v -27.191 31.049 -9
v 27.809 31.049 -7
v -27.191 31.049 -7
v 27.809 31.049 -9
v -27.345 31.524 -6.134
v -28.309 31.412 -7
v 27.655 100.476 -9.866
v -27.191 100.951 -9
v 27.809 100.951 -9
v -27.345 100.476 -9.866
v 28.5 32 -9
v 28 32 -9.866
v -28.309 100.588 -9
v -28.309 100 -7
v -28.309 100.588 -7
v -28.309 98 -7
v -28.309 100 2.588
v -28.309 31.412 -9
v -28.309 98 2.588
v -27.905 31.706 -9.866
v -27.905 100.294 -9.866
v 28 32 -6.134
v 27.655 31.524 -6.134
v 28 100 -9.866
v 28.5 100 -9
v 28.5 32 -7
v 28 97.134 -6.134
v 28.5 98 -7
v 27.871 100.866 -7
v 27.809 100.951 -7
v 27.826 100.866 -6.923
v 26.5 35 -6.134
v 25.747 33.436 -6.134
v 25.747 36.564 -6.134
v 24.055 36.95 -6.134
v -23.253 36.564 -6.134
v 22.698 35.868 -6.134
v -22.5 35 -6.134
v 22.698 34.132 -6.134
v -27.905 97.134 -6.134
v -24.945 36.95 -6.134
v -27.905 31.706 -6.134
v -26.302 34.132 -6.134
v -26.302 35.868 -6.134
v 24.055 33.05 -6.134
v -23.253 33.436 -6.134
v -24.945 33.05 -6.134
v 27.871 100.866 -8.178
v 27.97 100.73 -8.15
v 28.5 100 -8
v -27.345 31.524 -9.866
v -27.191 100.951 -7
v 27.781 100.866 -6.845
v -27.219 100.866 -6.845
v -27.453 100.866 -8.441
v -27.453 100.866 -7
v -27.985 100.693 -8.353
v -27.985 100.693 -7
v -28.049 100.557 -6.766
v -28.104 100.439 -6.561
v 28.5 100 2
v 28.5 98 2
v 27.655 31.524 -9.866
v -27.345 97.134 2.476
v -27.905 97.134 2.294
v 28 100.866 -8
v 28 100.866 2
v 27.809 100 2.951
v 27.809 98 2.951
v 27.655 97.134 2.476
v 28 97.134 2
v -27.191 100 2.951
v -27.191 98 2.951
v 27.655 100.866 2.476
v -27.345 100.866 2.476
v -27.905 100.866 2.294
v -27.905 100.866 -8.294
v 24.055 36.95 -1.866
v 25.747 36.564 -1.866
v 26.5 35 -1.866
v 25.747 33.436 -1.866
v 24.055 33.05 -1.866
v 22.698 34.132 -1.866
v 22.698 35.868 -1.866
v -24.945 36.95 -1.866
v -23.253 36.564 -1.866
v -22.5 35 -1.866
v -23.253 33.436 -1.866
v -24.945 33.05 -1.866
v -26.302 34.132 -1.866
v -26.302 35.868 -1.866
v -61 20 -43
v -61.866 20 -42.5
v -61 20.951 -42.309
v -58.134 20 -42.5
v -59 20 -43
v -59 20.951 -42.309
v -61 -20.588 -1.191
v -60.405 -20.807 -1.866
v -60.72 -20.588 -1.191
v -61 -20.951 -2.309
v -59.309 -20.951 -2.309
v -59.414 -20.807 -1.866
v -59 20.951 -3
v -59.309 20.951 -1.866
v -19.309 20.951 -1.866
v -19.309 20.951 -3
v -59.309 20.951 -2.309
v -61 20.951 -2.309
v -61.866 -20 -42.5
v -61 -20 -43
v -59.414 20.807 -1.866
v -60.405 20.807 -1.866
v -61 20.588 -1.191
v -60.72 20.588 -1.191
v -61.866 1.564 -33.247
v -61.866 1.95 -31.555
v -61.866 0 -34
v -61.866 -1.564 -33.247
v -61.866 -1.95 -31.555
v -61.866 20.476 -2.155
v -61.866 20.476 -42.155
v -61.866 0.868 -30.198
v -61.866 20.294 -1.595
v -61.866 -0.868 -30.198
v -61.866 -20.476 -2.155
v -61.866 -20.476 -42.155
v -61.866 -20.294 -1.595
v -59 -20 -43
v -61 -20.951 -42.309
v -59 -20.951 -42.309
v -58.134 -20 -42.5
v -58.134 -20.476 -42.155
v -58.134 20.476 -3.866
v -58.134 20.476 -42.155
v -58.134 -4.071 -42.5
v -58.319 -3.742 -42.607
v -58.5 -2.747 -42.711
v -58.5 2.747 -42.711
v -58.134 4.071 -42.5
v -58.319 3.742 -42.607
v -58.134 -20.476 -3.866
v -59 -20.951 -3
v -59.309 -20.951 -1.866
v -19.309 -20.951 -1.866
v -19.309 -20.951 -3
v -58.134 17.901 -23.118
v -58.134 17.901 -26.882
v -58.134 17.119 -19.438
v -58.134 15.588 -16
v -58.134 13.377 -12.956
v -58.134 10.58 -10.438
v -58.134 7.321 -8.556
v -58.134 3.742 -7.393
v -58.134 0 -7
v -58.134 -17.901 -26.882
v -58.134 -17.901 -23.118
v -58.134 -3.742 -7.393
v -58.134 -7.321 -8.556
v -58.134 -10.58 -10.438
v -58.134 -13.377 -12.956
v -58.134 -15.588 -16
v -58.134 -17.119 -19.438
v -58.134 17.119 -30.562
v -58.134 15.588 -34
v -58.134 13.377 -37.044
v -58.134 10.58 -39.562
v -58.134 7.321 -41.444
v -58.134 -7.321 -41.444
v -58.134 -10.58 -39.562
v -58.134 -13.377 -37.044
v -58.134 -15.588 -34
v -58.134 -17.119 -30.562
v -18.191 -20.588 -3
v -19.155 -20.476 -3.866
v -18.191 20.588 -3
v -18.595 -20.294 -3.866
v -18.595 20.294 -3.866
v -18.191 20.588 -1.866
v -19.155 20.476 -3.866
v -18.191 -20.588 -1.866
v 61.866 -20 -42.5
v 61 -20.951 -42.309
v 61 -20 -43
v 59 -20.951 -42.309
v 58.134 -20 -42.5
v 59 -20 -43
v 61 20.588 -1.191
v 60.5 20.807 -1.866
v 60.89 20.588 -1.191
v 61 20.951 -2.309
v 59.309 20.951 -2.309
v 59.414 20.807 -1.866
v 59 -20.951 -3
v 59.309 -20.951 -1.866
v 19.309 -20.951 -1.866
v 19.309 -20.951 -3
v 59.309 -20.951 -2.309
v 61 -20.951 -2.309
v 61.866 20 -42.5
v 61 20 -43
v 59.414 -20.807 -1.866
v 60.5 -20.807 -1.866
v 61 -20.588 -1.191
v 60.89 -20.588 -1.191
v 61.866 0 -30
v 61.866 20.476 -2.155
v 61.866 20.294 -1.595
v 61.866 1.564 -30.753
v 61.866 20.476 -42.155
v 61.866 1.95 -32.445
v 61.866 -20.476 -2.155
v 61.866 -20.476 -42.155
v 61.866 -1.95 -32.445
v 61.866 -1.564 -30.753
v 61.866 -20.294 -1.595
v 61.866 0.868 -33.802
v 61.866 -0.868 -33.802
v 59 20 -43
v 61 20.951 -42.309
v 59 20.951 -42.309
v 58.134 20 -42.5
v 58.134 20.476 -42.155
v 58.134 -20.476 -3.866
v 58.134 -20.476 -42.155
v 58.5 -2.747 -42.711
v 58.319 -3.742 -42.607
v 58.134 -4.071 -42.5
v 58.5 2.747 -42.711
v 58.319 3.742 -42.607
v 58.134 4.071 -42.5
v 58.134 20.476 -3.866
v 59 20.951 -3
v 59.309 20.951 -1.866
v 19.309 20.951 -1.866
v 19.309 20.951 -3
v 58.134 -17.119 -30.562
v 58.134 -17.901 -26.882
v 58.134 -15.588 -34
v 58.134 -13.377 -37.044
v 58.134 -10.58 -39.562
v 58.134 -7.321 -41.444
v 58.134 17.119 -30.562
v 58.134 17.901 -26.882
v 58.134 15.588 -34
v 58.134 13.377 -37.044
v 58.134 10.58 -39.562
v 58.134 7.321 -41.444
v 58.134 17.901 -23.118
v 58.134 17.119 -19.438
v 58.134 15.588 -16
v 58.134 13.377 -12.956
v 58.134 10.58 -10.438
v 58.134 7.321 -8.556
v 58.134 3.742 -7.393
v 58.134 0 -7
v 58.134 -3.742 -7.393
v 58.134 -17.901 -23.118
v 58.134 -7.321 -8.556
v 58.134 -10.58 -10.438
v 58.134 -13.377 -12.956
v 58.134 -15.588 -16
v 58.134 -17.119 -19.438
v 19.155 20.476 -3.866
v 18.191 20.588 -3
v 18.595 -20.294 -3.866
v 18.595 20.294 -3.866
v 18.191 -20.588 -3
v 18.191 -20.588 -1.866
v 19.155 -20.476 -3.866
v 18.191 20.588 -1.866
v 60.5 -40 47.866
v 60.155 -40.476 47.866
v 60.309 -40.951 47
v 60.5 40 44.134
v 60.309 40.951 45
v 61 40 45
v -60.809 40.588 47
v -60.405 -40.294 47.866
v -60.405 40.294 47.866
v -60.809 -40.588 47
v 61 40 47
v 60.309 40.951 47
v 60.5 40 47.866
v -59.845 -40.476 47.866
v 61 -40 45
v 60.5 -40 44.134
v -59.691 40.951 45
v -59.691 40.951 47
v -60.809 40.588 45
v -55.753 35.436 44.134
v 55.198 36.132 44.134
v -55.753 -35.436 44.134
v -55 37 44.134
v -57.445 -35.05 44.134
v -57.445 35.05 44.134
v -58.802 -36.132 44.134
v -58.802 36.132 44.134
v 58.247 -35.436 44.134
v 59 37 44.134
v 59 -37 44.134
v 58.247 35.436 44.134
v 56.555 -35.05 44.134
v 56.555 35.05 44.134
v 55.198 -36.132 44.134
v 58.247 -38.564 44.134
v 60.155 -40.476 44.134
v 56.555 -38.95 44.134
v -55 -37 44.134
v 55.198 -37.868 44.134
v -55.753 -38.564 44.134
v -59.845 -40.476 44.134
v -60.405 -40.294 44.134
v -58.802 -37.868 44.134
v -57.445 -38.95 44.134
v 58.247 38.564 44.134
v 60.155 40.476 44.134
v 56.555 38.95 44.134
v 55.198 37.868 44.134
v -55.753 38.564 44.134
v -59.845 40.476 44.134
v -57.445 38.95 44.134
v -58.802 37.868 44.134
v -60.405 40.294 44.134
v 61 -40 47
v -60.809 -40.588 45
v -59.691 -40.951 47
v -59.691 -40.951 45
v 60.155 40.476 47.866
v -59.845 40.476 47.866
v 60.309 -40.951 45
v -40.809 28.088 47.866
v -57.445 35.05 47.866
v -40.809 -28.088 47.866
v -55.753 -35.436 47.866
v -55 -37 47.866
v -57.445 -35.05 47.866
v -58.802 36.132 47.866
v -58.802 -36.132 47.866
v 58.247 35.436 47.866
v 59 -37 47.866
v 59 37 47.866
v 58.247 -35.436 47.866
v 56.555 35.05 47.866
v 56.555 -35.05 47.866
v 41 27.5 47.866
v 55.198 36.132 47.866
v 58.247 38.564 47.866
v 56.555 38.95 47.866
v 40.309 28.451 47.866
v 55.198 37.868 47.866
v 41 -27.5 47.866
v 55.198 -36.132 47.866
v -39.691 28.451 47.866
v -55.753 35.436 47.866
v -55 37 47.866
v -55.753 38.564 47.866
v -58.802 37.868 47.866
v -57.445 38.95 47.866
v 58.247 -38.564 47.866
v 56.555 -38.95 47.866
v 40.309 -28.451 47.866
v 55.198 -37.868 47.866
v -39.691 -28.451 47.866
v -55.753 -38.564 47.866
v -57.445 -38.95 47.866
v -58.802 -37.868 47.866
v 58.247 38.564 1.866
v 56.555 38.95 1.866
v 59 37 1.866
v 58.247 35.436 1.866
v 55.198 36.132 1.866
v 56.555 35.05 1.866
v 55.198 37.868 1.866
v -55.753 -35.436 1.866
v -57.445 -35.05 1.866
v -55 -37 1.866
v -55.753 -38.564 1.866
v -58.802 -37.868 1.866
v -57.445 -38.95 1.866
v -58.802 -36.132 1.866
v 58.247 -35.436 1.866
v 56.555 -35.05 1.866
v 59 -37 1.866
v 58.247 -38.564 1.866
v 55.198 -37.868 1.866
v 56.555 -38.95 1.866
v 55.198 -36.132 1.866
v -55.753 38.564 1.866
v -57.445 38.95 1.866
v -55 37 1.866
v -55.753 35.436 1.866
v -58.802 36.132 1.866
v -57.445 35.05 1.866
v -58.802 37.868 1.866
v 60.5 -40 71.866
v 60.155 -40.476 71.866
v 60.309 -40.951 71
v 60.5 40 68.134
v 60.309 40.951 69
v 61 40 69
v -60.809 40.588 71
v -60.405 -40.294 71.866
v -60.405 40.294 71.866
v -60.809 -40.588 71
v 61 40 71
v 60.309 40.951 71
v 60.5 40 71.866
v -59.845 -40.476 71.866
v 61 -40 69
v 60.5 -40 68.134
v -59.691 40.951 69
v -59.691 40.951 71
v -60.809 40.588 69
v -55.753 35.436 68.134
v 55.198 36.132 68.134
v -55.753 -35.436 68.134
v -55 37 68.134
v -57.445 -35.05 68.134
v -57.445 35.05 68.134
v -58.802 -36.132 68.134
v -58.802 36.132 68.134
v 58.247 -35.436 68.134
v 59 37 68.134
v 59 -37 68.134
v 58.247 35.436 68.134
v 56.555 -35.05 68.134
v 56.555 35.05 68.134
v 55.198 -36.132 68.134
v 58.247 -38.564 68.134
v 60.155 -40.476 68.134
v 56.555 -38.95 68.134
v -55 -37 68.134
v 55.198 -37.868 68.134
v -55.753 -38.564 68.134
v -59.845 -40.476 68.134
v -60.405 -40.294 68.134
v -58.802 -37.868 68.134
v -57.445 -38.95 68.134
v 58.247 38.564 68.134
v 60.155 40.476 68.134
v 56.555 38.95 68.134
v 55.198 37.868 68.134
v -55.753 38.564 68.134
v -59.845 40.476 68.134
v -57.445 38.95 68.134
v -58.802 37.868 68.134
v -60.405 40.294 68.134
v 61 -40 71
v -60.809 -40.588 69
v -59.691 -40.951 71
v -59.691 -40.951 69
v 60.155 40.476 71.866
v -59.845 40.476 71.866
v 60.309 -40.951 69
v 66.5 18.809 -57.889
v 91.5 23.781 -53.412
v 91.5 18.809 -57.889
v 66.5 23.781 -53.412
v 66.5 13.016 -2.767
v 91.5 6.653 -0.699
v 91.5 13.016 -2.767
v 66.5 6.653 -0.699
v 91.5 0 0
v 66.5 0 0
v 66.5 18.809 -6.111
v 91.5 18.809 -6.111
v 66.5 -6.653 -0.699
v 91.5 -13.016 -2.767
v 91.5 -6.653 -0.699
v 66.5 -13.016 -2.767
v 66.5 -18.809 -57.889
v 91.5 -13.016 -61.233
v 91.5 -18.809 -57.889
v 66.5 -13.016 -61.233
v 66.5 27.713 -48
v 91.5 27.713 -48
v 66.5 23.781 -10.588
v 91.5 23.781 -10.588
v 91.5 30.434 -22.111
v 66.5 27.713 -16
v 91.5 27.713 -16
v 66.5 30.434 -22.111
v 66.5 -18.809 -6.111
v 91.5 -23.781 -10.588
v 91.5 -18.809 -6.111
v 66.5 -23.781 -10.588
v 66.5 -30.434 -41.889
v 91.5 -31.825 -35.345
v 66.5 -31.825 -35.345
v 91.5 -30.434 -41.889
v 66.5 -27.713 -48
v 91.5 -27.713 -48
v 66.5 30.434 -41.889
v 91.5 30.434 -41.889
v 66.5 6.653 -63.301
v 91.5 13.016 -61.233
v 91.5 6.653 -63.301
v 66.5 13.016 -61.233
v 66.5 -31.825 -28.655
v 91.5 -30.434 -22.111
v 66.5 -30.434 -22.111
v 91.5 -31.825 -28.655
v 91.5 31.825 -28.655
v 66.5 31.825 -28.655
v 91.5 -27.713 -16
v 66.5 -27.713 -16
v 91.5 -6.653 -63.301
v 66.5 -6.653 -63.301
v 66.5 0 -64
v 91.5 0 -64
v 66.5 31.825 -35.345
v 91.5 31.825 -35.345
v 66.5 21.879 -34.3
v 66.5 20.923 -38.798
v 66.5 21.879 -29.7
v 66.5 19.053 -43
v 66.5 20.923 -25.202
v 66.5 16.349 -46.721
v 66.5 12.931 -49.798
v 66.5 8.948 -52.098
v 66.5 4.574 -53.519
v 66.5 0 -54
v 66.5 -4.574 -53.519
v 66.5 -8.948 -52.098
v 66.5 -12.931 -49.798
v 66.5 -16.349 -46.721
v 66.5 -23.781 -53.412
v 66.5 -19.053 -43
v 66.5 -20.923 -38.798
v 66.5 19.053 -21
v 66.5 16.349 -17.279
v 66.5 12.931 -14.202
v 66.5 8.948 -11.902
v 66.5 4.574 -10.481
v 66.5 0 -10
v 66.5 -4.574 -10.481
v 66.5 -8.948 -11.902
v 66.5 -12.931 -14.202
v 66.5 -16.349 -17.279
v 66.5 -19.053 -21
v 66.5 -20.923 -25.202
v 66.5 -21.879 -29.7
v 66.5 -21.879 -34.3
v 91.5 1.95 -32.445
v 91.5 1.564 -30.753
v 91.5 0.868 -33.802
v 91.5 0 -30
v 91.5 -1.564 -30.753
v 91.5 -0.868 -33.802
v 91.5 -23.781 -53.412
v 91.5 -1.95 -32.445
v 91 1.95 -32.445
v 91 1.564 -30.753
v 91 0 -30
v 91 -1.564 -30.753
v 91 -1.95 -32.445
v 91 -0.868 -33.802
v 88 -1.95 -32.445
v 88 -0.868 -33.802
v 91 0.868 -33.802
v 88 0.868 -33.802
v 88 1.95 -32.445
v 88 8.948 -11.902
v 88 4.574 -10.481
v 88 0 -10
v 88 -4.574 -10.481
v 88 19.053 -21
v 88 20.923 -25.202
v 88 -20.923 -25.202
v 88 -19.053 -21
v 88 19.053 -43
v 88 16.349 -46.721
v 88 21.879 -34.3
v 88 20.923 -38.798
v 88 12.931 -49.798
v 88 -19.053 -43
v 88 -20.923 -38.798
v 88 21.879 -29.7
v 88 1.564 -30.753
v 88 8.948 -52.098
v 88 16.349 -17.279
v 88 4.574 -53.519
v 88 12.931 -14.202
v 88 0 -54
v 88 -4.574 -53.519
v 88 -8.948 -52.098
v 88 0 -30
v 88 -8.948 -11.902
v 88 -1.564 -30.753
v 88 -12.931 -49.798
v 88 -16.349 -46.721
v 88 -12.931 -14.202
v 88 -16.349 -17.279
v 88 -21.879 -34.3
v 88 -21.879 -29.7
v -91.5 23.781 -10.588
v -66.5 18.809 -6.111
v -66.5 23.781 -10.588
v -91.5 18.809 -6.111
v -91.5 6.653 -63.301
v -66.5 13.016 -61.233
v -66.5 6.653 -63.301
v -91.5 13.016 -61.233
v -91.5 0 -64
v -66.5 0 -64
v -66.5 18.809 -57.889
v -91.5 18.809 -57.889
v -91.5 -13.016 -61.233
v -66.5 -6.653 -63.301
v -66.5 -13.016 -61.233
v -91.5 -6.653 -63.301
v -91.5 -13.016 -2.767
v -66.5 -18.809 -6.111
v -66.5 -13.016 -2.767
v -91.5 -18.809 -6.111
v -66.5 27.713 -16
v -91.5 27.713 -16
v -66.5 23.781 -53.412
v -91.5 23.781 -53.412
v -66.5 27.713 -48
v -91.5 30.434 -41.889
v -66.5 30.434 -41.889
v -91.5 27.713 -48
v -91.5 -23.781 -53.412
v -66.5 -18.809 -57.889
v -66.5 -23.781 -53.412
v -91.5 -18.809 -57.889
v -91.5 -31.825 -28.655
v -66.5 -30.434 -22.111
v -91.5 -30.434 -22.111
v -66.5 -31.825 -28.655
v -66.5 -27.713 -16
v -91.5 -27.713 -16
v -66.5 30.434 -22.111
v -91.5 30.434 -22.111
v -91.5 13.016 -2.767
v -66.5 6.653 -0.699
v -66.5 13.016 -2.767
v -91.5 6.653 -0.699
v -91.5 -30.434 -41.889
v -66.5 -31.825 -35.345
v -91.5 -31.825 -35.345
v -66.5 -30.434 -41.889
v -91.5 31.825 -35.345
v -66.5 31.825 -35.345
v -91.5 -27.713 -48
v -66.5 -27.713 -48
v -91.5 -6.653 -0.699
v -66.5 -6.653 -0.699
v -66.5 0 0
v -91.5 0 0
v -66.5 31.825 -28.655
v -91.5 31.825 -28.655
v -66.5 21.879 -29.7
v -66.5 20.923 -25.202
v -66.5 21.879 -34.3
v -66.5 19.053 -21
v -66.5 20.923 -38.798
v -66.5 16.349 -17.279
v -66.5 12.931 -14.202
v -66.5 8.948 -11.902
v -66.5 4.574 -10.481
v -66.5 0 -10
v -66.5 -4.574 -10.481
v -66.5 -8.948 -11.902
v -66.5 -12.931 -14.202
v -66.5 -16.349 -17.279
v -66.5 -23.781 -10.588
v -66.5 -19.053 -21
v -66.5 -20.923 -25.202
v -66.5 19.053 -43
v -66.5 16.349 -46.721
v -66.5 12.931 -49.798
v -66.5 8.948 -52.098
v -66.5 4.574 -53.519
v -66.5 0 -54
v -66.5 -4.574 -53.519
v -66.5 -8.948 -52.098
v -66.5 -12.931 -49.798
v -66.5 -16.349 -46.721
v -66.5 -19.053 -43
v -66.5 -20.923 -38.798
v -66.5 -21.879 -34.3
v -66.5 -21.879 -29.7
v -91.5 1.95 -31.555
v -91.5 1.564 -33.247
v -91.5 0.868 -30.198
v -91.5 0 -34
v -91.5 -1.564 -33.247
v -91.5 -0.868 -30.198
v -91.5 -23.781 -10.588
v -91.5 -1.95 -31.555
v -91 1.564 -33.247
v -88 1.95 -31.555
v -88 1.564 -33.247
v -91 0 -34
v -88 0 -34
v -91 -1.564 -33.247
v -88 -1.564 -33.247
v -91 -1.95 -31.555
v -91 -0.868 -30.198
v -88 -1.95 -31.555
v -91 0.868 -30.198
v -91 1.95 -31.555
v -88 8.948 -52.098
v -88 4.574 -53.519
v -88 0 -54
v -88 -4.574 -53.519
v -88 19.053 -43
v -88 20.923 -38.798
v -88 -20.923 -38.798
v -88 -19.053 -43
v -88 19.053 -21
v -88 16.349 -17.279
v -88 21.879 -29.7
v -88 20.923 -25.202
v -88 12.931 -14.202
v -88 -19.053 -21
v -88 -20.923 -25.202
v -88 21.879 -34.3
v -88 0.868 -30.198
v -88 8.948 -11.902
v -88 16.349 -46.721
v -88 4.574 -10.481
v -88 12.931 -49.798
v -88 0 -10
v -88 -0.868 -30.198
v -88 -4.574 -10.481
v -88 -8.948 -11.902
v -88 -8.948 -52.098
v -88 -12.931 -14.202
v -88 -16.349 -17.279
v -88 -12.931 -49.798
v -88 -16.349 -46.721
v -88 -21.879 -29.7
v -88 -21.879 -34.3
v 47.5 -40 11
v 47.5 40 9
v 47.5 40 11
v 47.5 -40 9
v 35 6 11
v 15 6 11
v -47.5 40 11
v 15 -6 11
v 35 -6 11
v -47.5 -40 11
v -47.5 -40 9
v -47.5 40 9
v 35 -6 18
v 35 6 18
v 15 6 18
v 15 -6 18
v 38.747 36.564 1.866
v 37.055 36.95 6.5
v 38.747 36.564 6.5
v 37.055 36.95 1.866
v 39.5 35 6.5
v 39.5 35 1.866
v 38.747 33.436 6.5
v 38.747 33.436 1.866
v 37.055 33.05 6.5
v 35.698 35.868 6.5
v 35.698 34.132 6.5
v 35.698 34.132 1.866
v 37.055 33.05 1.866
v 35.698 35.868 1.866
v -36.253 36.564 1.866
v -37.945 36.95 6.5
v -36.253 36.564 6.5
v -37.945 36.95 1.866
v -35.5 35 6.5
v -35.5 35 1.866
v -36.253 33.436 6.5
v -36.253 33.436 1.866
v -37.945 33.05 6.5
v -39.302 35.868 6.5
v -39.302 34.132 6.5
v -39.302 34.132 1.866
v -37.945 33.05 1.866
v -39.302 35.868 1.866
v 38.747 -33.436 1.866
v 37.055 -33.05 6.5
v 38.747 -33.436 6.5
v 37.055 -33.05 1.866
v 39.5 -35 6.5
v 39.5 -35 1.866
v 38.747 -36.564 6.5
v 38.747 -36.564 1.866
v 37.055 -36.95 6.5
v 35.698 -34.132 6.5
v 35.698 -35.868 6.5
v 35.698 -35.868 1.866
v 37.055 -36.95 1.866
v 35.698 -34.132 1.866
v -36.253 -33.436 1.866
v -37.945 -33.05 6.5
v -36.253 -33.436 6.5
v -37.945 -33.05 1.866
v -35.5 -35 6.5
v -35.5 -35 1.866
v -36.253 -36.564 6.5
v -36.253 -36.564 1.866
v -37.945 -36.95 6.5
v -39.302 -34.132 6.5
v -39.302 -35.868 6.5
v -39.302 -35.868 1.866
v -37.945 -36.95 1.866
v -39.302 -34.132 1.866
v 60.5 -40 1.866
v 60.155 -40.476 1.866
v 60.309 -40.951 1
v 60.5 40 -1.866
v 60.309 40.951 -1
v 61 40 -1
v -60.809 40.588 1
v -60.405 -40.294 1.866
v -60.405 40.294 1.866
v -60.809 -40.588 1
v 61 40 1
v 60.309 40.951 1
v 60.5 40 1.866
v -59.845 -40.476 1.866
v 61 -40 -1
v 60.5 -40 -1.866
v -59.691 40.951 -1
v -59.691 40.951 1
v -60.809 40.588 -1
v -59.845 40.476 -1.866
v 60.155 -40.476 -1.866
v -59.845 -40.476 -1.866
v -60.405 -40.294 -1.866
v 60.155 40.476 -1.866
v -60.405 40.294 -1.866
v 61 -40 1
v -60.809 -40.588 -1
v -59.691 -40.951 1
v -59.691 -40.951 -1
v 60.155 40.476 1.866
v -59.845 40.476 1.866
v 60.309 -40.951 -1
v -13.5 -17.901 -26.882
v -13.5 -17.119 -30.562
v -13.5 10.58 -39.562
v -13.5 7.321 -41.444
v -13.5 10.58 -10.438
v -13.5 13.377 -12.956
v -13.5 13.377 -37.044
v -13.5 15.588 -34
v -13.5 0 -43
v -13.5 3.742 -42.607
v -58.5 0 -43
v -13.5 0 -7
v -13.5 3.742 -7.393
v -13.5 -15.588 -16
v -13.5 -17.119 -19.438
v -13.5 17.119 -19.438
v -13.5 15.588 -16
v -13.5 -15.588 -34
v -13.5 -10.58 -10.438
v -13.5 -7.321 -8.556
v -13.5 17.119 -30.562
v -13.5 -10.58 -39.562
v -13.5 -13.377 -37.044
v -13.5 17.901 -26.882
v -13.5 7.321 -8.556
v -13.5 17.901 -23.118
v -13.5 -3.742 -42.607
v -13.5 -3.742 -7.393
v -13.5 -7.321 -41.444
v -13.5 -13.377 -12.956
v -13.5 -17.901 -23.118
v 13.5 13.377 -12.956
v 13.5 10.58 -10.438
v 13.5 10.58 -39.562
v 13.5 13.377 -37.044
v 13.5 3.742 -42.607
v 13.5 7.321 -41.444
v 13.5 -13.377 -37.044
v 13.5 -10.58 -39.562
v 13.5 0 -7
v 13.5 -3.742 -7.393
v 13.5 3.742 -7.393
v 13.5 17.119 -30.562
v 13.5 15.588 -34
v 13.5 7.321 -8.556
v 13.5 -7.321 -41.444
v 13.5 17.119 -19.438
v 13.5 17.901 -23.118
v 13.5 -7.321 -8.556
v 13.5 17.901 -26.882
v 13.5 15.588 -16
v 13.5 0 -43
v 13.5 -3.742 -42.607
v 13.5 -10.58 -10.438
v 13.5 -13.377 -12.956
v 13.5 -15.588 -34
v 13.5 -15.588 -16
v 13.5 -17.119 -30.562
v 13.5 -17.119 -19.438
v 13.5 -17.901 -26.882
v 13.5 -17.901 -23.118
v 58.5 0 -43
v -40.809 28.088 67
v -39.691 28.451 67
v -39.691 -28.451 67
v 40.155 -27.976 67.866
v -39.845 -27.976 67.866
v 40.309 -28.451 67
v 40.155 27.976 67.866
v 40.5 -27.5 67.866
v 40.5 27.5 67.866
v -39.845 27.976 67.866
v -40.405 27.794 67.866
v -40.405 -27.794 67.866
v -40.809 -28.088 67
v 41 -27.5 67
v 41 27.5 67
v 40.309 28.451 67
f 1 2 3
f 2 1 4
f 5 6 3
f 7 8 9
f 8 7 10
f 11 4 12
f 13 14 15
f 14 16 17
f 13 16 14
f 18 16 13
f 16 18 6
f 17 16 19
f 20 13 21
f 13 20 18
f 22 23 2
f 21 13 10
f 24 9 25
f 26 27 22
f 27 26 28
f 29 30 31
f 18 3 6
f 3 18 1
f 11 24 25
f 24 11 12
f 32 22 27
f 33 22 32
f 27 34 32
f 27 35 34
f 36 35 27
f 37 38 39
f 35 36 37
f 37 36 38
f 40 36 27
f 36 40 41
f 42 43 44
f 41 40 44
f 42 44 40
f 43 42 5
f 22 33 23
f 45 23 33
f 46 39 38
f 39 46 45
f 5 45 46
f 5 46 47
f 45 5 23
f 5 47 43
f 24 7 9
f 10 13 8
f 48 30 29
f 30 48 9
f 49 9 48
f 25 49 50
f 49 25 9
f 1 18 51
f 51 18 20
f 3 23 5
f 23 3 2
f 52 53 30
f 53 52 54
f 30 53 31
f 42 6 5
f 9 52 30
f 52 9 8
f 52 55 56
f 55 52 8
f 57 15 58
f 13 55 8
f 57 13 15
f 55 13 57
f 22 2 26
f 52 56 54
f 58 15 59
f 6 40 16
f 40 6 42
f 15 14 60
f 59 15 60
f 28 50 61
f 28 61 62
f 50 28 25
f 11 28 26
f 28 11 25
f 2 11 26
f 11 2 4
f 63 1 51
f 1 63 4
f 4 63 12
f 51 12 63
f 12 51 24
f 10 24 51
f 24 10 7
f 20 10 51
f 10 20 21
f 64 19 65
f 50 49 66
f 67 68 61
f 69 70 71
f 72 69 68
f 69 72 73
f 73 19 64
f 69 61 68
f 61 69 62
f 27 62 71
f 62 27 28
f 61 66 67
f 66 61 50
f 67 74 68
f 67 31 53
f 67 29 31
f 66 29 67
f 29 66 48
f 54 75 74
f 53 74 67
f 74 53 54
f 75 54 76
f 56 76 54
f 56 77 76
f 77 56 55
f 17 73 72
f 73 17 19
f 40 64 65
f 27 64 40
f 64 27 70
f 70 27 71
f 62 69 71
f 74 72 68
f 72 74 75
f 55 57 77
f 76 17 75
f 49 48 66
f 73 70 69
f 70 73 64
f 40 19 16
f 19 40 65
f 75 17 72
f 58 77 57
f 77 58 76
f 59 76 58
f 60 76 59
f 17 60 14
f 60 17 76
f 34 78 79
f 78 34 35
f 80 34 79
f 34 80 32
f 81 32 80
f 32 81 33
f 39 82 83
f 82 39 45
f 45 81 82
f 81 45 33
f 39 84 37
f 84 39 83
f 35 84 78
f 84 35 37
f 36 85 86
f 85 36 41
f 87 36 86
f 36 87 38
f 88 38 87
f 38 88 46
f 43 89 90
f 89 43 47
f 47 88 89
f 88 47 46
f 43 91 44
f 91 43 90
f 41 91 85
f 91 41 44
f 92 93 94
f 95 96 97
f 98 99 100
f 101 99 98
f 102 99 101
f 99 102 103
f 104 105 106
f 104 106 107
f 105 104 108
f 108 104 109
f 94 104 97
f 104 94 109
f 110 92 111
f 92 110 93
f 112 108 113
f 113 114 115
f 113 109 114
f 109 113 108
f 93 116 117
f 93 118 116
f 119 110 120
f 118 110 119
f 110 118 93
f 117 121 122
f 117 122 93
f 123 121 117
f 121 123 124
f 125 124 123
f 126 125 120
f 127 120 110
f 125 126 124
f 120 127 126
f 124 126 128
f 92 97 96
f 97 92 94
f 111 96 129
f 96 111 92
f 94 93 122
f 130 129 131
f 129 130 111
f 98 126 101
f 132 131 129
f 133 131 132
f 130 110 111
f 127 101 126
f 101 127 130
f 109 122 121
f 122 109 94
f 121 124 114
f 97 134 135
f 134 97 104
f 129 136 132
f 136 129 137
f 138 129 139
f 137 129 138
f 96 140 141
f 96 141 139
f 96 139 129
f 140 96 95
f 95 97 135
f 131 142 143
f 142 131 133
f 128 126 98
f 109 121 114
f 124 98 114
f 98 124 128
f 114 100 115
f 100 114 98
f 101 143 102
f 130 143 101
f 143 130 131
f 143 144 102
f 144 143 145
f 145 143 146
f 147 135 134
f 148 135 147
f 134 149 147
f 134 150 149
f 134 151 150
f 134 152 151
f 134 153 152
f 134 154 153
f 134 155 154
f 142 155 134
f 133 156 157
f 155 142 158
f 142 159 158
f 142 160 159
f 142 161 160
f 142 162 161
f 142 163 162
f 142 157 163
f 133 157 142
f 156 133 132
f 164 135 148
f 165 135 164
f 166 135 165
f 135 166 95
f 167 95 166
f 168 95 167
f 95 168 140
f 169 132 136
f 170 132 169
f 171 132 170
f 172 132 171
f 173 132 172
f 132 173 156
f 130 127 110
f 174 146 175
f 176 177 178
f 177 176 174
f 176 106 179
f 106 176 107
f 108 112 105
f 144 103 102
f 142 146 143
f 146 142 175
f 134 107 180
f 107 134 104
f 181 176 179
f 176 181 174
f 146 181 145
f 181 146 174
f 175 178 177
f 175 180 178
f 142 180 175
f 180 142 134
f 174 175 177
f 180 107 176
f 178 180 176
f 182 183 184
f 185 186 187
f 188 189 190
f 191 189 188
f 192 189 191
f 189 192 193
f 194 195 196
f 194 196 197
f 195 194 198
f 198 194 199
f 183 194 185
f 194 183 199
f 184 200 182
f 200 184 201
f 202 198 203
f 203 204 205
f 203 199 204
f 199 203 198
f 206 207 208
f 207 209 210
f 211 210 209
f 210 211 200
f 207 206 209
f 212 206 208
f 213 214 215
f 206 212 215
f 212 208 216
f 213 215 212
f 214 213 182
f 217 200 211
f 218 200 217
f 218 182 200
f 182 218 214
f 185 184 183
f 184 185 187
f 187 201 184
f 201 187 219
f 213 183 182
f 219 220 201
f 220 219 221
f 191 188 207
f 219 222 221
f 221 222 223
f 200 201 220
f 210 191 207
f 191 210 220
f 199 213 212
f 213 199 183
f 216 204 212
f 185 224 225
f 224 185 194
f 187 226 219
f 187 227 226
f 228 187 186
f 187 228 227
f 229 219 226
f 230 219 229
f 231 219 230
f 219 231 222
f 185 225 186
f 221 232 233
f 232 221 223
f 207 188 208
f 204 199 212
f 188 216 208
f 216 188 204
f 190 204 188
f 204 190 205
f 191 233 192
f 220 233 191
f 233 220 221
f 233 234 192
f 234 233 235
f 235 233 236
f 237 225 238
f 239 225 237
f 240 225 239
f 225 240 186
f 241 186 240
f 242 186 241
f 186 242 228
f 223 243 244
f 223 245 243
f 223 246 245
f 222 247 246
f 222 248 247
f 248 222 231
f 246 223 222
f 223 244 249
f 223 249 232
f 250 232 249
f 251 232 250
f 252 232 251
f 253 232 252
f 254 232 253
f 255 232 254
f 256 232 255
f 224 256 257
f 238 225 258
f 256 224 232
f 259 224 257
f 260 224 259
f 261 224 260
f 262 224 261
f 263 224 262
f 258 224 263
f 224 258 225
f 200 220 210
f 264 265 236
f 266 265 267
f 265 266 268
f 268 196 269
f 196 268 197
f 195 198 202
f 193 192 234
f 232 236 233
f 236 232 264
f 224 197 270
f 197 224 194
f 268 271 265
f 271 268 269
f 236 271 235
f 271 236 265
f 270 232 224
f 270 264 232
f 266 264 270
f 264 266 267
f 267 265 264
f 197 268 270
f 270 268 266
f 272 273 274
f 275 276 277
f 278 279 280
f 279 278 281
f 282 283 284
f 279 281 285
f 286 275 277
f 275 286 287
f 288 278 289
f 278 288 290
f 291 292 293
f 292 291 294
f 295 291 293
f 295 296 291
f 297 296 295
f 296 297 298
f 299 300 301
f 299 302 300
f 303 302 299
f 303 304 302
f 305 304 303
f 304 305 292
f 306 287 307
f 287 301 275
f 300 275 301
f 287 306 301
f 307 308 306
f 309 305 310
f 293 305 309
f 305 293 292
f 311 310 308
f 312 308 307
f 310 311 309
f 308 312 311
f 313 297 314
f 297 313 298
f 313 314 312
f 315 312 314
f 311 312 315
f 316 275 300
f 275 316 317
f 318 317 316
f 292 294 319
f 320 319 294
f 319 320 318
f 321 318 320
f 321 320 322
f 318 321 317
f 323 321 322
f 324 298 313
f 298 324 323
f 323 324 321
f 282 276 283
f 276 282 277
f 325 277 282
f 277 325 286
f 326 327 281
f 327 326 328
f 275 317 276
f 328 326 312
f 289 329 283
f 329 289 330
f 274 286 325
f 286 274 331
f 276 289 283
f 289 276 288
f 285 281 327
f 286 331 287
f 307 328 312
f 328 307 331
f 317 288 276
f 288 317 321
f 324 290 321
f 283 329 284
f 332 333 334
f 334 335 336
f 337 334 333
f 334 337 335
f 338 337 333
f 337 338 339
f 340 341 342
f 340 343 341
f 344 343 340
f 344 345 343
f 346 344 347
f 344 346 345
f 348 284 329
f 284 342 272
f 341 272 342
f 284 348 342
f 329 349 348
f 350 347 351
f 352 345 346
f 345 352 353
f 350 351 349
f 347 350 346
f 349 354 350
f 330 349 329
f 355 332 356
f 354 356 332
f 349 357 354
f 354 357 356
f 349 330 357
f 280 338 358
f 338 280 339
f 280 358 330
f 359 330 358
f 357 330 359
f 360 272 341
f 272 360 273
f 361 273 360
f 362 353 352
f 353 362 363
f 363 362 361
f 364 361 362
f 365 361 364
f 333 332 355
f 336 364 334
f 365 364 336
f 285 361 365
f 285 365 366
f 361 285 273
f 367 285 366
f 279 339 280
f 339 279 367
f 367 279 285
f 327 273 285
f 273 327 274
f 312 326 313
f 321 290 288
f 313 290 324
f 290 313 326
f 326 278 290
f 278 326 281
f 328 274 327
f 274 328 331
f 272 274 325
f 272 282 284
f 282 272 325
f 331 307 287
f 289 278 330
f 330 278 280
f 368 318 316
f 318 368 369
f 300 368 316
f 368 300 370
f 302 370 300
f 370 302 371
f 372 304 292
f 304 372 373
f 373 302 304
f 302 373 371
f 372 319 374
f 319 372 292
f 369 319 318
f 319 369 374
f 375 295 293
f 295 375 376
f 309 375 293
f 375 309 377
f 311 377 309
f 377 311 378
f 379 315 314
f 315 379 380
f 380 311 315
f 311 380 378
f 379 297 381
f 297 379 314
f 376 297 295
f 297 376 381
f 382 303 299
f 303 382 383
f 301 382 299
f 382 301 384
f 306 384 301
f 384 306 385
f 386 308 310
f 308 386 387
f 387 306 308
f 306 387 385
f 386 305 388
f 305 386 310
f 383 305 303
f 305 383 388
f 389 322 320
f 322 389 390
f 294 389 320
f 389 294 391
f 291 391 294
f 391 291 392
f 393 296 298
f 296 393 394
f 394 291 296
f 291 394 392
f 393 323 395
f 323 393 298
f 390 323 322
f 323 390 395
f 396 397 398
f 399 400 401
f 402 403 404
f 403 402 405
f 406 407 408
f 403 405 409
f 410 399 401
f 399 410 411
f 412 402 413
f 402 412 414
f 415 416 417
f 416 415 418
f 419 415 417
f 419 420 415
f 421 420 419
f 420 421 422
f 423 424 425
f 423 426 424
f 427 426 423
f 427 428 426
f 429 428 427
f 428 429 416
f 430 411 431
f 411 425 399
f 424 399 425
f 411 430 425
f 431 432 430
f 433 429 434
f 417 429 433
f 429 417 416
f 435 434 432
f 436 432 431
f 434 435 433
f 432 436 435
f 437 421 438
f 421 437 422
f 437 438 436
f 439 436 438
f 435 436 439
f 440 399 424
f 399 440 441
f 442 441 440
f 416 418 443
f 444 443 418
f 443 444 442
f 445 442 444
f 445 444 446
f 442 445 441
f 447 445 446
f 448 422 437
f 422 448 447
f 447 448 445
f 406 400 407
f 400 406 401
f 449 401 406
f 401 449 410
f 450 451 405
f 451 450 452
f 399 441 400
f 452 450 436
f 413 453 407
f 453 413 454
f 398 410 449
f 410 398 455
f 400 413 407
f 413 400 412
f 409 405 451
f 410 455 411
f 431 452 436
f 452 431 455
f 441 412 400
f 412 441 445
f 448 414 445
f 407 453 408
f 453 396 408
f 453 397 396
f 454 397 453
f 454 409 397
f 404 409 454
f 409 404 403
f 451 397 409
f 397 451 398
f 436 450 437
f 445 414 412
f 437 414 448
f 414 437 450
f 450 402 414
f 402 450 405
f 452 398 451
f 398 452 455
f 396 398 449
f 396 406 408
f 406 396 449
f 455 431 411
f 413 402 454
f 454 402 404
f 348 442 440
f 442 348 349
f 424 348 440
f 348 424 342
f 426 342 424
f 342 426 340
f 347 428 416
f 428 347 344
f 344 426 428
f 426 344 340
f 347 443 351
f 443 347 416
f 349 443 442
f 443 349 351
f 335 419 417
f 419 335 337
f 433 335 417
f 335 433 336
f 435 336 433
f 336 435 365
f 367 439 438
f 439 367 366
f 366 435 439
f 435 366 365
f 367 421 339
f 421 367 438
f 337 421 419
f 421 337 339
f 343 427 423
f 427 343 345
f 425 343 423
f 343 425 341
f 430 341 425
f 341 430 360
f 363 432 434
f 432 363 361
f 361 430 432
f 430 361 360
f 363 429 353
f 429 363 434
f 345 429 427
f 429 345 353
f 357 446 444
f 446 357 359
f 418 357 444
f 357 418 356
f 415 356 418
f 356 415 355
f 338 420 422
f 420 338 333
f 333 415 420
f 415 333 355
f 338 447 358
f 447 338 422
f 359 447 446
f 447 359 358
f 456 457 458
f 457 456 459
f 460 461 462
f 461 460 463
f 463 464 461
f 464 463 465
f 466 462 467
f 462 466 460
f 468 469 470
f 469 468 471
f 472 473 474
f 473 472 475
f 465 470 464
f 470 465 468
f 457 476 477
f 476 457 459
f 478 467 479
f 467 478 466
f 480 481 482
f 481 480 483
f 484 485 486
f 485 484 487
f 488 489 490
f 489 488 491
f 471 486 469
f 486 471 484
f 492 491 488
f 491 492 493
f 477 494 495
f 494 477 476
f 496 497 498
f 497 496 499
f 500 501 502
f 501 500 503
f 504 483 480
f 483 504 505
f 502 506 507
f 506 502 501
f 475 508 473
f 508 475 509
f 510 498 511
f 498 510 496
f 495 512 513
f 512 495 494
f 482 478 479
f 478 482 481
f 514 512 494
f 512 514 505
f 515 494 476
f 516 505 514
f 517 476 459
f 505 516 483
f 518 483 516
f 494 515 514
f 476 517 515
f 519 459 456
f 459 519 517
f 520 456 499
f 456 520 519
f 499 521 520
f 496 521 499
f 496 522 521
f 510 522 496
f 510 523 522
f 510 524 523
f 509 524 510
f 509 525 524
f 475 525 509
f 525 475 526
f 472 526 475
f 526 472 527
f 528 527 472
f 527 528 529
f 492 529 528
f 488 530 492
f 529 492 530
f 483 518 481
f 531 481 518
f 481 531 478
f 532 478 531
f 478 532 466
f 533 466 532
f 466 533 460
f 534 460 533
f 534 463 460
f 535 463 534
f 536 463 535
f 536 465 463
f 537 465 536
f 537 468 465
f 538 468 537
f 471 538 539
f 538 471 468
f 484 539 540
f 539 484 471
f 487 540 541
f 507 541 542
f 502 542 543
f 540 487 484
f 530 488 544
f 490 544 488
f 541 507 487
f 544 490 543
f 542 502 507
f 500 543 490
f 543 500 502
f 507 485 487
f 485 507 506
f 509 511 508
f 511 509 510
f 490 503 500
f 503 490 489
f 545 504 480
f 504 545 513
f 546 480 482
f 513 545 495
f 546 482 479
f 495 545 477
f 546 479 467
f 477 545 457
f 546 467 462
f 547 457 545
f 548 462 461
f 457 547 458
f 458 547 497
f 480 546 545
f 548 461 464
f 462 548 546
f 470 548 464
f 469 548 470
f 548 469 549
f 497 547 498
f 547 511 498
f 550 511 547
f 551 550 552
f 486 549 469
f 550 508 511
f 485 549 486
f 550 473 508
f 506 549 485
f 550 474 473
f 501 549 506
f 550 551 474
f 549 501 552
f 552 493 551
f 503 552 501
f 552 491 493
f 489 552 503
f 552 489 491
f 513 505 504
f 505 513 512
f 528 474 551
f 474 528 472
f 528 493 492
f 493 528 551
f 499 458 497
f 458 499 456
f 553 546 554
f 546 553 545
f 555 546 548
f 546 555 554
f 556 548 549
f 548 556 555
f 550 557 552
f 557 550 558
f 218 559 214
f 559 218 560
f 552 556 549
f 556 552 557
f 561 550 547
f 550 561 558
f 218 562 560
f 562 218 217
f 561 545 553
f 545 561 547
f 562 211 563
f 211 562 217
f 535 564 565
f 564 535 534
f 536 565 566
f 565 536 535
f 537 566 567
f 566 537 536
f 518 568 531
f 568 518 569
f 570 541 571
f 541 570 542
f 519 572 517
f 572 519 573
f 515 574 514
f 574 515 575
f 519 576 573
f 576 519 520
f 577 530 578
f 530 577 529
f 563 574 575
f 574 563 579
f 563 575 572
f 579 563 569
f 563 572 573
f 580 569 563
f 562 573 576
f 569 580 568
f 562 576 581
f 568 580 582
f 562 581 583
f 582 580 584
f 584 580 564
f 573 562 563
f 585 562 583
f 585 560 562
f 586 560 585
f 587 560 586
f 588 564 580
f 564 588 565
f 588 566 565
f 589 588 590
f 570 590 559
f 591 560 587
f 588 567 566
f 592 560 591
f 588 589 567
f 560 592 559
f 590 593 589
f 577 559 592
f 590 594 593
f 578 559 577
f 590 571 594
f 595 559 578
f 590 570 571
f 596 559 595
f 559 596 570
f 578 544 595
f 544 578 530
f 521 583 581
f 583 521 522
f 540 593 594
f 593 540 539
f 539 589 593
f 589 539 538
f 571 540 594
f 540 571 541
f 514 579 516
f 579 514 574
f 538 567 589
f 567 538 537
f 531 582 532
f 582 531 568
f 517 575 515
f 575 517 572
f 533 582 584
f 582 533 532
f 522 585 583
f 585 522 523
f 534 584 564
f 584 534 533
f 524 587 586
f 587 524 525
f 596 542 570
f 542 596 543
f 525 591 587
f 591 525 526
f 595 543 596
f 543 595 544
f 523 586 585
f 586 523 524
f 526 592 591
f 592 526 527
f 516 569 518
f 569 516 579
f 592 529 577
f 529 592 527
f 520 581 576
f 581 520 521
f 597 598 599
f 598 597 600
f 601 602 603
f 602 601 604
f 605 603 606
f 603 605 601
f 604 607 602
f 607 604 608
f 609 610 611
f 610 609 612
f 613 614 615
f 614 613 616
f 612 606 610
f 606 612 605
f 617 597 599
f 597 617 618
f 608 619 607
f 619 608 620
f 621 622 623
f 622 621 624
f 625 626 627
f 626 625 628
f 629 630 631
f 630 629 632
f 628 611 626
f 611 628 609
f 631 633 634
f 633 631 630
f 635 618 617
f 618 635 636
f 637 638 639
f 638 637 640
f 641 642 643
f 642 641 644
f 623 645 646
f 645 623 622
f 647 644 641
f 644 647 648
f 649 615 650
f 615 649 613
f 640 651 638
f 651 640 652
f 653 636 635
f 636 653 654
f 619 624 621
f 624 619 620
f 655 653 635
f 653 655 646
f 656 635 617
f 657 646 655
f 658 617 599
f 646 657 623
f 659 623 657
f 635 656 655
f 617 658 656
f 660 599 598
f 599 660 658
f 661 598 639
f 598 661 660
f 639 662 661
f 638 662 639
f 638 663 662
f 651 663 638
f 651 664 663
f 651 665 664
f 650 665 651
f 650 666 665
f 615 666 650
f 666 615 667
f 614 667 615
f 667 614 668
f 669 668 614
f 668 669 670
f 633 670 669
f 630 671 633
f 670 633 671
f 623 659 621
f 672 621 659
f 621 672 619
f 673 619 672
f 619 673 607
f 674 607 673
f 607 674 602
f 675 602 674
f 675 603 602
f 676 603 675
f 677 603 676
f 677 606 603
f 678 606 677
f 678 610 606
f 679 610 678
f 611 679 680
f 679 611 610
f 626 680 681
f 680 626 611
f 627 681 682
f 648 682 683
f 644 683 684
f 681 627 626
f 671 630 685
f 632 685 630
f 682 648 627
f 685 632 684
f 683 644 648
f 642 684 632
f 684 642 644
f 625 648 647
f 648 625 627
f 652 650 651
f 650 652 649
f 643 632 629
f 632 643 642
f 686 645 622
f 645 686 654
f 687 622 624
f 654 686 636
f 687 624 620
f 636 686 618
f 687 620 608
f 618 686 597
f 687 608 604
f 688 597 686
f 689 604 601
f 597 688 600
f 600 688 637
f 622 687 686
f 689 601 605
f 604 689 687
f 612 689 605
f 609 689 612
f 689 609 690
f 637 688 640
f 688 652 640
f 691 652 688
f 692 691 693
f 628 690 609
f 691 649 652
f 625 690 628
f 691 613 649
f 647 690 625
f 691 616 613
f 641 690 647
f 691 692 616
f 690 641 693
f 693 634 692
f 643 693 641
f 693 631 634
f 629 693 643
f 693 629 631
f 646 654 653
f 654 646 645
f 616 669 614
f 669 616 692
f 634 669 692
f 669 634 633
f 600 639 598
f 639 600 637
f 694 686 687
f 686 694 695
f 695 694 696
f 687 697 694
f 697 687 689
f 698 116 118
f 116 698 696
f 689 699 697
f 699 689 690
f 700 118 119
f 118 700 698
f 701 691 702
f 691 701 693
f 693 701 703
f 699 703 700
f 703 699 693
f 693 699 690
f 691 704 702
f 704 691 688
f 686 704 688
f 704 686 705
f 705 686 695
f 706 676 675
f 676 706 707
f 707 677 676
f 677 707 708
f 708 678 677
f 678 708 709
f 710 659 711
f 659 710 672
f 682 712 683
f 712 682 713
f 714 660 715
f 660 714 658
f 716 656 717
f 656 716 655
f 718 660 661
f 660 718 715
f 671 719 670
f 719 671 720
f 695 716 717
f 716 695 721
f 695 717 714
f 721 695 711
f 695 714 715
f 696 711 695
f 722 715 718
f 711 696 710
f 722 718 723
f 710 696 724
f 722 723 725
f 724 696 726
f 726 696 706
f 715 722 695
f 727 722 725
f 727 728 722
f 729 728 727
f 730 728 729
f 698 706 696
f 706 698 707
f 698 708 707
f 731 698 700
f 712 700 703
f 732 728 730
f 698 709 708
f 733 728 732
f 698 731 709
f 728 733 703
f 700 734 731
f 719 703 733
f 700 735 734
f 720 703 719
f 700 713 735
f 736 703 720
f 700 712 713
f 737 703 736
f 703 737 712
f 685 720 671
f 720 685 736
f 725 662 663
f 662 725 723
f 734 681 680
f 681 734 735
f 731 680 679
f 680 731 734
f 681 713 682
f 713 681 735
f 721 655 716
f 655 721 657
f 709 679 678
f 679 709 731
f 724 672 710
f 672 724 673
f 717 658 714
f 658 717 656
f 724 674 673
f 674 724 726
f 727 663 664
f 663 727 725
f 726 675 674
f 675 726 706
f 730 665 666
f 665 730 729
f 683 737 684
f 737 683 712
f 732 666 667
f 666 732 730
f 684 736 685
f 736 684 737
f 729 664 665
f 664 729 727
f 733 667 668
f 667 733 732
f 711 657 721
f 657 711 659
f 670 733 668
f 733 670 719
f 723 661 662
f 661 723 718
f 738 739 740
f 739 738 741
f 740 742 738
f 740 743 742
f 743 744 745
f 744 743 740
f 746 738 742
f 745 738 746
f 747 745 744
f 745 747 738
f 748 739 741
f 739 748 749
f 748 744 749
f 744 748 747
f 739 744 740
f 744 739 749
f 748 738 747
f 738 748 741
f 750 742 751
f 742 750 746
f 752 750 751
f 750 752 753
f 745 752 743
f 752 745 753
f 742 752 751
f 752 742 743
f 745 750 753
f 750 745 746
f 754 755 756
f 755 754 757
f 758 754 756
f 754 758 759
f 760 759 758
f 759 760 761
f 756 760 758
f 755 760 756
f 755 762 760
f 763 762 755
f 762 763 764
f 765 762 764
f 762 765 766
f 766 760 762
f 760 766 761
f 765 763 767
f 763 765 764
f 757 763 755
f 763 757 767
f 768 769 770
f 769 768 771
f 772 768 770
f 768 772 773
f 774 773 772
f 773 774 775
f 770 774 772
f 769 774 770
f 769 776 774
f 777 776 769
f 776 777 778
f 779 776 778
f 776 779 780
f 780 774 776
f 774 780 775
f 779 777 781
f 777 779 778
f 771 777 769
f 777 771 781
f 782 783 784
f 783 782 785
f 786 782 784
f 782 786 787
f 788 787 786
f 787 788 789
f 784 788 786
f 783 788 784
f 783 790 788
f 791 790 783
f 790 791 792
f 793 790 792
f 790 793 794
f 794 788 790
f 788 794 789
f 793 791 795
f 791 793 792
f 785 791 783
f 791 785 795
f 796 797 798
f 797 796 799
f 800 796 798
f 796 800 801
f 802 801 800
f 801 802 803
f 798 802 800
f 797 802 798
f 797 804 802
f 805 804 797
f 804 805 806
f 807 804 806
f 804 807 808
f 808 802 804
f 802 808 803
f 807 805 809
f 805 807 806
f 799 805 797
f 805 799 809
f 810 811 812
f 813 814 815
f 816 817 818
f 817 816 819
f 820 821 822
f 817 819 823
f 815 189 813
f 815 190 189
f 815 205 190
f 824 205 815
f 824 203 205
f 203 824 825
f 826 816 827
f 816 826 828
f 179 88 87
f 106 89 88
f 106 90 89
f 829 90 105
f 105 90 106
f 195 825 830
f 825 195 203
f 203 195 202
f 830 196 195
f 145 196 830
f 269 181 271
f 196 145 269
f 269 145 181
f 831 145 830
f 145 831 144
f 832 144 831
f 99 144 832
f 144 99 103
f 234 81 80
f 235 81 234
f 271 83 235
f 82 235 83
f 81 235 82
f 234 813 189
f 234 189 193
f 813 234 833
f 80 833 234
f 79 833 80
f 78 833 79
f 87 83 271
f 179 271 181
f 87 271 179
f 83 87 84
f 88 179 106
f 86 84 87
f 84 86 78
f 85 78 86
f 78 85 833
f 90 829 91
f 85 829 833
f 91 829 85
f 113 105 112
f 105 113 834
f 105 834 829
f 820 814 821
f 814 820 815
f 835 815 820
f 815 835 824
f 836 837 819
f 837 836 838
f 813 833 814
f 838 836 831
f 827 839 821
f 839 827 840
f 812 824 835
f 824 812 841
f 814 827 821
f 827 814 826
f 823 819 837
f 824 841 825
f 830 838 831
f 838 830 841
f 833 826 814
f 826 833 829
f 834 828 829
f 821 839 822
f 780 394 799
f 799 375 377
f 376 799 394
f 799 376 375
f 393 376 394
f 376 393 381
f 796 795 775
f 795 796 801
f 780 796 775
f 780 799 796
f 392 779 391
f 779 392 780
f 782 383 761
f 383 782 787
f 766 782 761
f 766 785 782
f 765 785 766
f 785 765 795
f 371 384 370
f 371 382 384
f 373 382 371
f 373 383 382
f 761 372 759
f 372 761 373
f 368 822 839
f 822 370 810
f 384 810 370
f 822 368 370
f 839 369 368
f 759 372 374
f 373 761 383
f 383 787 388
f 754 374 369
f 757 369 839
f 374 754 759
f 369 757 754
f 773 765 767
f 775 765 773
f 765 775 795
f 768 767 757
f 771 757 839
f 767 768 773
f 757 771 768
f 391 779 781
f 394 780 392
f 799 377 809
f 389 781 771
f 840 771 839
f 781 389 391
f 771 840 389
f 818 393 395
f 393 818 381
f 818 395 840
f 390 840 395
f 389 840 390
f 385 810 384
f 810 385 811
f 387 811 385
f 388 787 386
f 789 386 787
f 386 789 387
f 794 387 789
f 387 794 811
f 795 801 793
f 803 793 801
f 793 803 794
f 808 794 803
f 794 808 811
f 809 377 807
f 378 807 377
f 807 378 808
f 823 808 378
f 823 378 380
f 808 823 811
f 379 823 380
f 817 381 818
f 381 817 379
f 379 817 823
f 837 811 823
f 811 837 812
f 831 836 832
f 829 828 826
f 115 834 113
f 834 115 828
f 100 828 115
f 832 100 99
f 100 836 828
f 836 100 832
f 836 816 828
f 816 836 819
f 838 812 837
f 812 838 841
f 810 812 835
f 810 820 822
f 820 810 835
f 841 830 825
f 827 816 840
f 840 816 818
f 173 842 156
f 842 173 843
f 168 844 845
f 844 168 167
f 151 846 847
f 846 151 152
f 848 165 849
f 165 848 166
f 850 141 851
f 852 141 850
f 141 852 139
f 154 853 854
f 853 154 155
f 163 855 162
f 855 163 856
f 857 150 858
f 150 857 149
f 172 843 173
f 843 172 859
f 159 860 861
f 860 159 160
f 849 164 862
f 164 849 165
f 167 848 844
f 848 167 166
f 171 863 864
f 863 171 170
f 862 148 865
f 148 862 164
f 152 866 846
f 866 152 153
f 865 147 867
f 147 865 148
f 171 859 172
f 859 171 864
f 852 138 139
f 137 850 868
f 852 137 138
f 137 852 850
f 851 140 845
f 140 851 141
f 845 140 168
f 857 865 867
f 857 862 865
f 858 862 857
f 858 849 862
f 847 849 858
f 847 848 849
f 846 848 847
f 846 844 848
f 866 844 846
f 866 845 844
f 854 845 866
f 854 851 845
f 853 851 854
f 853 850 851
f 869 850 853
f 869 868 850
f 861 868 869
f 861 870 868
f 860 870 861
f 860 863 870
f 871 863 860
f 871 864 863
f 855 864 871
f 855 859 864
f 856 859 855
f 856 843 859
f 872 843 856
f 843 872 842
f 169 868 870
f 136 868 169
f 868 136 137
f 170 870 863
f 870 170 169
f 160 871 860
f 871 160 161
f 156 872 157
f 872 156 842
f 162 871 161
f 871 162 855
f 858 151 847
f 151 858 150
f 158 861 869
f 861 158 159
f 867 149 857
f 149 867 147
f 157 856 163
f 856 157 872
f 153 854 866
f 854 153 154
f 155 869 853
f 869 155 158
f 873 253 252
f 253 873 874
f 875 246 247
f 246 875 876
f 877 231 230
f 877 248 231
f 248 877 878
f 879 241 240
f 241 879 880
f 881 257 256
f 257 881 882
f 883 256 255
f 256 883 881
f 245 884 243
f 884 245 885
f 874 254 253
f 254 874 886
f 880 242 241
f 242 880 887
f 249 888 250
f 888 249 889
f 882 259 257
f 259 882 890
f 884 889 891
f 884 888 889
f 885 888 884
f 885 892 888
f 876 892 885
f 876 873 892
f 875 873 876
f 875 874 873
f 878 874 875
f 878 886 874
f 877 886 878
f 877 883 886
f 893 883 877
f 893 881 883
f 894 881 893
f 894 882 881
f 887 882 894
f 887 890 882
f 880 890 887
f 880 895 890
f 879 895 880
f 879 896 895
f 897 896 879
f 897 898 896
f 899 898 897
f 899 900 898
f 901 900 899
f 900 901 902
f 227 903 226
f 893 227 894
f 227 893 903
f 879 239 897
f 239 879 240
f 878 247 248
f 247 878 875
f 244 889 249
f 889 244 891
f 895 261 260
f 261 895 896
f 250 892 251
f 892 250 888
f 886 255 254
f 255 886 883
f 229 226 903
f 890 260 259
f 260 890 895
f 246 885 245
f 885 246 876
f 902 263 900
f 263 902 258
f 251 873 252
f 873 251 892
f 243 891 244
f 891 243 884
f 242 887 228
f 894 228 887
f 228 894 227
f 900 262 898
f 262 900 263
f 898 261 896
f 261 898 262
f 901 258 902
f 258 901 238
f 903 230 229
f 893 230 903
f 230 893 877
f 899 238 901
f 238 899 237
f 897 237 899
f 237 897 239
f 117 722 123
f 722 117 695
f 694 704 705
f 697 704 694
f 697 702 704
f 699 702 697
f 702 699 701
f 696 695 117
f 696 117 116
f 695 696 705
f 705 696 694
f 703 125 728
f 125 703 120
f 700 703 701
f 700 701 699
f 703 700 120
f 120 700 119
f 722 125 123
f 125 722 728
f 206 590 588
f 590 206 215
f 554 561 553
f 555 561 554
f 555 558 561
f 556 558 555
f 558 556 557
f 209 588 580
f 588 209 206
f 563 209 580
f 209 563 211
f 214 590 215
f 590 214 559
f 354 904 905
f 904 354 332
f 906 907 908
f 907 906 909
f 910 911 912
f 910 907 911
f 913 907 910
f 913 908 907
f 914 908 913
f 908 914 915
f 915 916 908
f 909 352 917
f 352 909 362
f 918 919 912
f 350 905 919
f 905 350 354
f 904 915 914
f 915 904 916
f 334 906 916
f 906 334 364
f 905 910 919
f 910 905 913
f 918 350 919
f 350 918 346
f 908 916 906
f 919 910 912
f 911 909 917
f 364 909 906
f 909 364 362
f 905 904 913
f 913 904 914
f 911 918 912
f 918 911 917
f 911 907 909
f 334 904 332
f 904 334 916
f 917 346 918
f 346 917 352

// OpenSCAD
// tumbller.scad
// Single-file non-parametric model for Elegoo Tumbller (visual/collision meshes).

export_part = "all";
chassis_length=80; //mm
chassis_width=120;

module wheel() {
  difference() {
    cylinder(h=25, r=32, center=true);
    cylinder(h=30, r=2, center=true);
    translate([0,0,6]) cylinder(h=30, r=22, center=true);
  }
}

module motor() {
  cylinder(h=45, r=18, center=true);
}

module lsupport() {
  rounded_box([40,40,2], 1);
  translate([-20,0,21]) rotate([0,90,0])
  rounded_box([40,40,2], 1);
}

module shaft() {
  cylinder(h=30, r=2, center=true);
}

module plate(width, length) {
  rounded_box([width,length,2], 1);
}

module battery_plate(width, length) {
  plate(width, length);
  translate([width / 2 - 3, length / 2 - 3, -45 / 2 - 1]) cylinder(h=45, r=2, center=true);
  translate([-(width / 2 - 3), -(length / 2 - 3), -45 / 2 - 1]) cylinder(h=45, r=2, center=true);
  translate([width / 2 - 3, -(length / 2 - 3), -45 / 2 - 1]) cylinder(h=45, r=2, center=true);
  translate([-(width / 2 - 3), length / 2 - 3, -45 / 2 - 1]) cylinder(h=45, r=2, center=true);
}

module top_plate(width, length) {
  support_height = 22;
  plate(width, length);
  translate([width / 2 - 3, length / 2 - 3, -support_height / 2 - 1]) cylinder(h=support_height, r=2, center=true);
  translate([-(width / 2 - 3), -(length / 2 - 3), -support_height / 2 - 1]) cylinder(h=support_height, r=2, center=true);
  translate([width / 2 - 3, -(length / 2 - 3), -support_height / 2 - 1]) cylinder(h=support_height, r=2, center=true);
  translate([-(width / 2 - 3), length / 2 - 3, -support_height / 2 - 1]) cylinder(h=support_height, r=2, center=true);
}

module rounded_box(size=[100,50,20], r=5) {
  minkowski() {
    cube(size, center=true);
    sphere(r=r);
  }
}

module pcb() {
  h=5;
  translate([0,0,0]) cube([95,80,2], center=true);
  // short sensor bump
  translate([25,0,4]) cube([20,12,8], center=true);
  translate([95 / 2 - 10, 80 / 2 - 5, -6]) cylinder(h=h, r=2, center=true);
  translate([- (95 / 2 - 10), 80 / 2 - 5, -6]) cylinder(h=5, r=2, center=true);
  translate([95 / 2 - 10, -(80 / 2 - 5), -6]) cylinder(h=h, r=2, center=true);
  translate([-(95 / 2 - 10), -(80 / 2 - 5), -6]) cylinder(h=h, r=2, center=true);
}

module battery() {
  rounded_box([80,55,22], 1);
}

module kickstand() {
  h=5;
  rounded_box([55,68,2], 1);
  translate([0,68 / 2 -1,5]) rotate([90,0,0])
  rounded_box([55,10,2], 1);
  translate([55 / 2 - 3, -(68 / 2 - 3), h-1]) cylinder(h=h, r=2, center=true);
  translate([-(55 / 2 - 3), -(68 / 2 - 3), h-1]) cylinder(h=h, r=2, center=true);
}

module tumbller_assembly() {
  // Chassis
  translate([0,0,0]) plate(chassis_width, chassis_length);
  
  translate([0, 68 - 2, -8]) kickstand();

  translate([-60, 0, -22]) rotate([0, 90, 0]) lsupport();
  translate([60, 0, -22]) rotate([0, 90, 180]) lsupport();

  // Motors
  translate([-36, 0, -25]) rotate([0, 90, 0]) motor();
  translate([36, 0, -25]) rotate([0, -90, 0]) motor();

  // Shafts
  translate([-76, 0, -32]) rotate([0, 90, 0]) shaft();
  translate([76, 0, -32]) rotate([0, -90, 0]) shaft();
  
  // Battery plate
  translate([0,0,46]) battery_plate(chassis_width, chassis_length);

  // Top
  translate([0,0,46 + 24]) top_plate(chassis_width, chassis_length);
  
  // Left wheel
  translate([79,0,-32]) rotate([0,-90,0]) wheel();
  // Right wheel
  translate([-79,0,-32]) rotate([0,90,0]) wheel();

  // Battery on top
  translate([0,0,56]) battery();

  // PCB
  translate([0,0,10]) pcb();
}

// ---------- Export selection helper ----------
if (export_part == "all") {
  tumbller_assembly();
} else if (export_part == "chassis") {
  plate();
} else if (export_part == "battery_plate") {
  plate();
} else if (export_part == "top") {
  plate();
} else if (export_part == "wheel") {
  wheel();
} else if (export_part == "pcb") {
  pcb();
} else if (export_part == "battery") {
  battery();
} else if (export_part == "kickstand") {
  kickstand();
} else if (export_part == "motor") {
  motor();
} else if (export_part == "lsupport") {
  lsupport();
} else if (export_part == "shaft") {
  shaft();
}
